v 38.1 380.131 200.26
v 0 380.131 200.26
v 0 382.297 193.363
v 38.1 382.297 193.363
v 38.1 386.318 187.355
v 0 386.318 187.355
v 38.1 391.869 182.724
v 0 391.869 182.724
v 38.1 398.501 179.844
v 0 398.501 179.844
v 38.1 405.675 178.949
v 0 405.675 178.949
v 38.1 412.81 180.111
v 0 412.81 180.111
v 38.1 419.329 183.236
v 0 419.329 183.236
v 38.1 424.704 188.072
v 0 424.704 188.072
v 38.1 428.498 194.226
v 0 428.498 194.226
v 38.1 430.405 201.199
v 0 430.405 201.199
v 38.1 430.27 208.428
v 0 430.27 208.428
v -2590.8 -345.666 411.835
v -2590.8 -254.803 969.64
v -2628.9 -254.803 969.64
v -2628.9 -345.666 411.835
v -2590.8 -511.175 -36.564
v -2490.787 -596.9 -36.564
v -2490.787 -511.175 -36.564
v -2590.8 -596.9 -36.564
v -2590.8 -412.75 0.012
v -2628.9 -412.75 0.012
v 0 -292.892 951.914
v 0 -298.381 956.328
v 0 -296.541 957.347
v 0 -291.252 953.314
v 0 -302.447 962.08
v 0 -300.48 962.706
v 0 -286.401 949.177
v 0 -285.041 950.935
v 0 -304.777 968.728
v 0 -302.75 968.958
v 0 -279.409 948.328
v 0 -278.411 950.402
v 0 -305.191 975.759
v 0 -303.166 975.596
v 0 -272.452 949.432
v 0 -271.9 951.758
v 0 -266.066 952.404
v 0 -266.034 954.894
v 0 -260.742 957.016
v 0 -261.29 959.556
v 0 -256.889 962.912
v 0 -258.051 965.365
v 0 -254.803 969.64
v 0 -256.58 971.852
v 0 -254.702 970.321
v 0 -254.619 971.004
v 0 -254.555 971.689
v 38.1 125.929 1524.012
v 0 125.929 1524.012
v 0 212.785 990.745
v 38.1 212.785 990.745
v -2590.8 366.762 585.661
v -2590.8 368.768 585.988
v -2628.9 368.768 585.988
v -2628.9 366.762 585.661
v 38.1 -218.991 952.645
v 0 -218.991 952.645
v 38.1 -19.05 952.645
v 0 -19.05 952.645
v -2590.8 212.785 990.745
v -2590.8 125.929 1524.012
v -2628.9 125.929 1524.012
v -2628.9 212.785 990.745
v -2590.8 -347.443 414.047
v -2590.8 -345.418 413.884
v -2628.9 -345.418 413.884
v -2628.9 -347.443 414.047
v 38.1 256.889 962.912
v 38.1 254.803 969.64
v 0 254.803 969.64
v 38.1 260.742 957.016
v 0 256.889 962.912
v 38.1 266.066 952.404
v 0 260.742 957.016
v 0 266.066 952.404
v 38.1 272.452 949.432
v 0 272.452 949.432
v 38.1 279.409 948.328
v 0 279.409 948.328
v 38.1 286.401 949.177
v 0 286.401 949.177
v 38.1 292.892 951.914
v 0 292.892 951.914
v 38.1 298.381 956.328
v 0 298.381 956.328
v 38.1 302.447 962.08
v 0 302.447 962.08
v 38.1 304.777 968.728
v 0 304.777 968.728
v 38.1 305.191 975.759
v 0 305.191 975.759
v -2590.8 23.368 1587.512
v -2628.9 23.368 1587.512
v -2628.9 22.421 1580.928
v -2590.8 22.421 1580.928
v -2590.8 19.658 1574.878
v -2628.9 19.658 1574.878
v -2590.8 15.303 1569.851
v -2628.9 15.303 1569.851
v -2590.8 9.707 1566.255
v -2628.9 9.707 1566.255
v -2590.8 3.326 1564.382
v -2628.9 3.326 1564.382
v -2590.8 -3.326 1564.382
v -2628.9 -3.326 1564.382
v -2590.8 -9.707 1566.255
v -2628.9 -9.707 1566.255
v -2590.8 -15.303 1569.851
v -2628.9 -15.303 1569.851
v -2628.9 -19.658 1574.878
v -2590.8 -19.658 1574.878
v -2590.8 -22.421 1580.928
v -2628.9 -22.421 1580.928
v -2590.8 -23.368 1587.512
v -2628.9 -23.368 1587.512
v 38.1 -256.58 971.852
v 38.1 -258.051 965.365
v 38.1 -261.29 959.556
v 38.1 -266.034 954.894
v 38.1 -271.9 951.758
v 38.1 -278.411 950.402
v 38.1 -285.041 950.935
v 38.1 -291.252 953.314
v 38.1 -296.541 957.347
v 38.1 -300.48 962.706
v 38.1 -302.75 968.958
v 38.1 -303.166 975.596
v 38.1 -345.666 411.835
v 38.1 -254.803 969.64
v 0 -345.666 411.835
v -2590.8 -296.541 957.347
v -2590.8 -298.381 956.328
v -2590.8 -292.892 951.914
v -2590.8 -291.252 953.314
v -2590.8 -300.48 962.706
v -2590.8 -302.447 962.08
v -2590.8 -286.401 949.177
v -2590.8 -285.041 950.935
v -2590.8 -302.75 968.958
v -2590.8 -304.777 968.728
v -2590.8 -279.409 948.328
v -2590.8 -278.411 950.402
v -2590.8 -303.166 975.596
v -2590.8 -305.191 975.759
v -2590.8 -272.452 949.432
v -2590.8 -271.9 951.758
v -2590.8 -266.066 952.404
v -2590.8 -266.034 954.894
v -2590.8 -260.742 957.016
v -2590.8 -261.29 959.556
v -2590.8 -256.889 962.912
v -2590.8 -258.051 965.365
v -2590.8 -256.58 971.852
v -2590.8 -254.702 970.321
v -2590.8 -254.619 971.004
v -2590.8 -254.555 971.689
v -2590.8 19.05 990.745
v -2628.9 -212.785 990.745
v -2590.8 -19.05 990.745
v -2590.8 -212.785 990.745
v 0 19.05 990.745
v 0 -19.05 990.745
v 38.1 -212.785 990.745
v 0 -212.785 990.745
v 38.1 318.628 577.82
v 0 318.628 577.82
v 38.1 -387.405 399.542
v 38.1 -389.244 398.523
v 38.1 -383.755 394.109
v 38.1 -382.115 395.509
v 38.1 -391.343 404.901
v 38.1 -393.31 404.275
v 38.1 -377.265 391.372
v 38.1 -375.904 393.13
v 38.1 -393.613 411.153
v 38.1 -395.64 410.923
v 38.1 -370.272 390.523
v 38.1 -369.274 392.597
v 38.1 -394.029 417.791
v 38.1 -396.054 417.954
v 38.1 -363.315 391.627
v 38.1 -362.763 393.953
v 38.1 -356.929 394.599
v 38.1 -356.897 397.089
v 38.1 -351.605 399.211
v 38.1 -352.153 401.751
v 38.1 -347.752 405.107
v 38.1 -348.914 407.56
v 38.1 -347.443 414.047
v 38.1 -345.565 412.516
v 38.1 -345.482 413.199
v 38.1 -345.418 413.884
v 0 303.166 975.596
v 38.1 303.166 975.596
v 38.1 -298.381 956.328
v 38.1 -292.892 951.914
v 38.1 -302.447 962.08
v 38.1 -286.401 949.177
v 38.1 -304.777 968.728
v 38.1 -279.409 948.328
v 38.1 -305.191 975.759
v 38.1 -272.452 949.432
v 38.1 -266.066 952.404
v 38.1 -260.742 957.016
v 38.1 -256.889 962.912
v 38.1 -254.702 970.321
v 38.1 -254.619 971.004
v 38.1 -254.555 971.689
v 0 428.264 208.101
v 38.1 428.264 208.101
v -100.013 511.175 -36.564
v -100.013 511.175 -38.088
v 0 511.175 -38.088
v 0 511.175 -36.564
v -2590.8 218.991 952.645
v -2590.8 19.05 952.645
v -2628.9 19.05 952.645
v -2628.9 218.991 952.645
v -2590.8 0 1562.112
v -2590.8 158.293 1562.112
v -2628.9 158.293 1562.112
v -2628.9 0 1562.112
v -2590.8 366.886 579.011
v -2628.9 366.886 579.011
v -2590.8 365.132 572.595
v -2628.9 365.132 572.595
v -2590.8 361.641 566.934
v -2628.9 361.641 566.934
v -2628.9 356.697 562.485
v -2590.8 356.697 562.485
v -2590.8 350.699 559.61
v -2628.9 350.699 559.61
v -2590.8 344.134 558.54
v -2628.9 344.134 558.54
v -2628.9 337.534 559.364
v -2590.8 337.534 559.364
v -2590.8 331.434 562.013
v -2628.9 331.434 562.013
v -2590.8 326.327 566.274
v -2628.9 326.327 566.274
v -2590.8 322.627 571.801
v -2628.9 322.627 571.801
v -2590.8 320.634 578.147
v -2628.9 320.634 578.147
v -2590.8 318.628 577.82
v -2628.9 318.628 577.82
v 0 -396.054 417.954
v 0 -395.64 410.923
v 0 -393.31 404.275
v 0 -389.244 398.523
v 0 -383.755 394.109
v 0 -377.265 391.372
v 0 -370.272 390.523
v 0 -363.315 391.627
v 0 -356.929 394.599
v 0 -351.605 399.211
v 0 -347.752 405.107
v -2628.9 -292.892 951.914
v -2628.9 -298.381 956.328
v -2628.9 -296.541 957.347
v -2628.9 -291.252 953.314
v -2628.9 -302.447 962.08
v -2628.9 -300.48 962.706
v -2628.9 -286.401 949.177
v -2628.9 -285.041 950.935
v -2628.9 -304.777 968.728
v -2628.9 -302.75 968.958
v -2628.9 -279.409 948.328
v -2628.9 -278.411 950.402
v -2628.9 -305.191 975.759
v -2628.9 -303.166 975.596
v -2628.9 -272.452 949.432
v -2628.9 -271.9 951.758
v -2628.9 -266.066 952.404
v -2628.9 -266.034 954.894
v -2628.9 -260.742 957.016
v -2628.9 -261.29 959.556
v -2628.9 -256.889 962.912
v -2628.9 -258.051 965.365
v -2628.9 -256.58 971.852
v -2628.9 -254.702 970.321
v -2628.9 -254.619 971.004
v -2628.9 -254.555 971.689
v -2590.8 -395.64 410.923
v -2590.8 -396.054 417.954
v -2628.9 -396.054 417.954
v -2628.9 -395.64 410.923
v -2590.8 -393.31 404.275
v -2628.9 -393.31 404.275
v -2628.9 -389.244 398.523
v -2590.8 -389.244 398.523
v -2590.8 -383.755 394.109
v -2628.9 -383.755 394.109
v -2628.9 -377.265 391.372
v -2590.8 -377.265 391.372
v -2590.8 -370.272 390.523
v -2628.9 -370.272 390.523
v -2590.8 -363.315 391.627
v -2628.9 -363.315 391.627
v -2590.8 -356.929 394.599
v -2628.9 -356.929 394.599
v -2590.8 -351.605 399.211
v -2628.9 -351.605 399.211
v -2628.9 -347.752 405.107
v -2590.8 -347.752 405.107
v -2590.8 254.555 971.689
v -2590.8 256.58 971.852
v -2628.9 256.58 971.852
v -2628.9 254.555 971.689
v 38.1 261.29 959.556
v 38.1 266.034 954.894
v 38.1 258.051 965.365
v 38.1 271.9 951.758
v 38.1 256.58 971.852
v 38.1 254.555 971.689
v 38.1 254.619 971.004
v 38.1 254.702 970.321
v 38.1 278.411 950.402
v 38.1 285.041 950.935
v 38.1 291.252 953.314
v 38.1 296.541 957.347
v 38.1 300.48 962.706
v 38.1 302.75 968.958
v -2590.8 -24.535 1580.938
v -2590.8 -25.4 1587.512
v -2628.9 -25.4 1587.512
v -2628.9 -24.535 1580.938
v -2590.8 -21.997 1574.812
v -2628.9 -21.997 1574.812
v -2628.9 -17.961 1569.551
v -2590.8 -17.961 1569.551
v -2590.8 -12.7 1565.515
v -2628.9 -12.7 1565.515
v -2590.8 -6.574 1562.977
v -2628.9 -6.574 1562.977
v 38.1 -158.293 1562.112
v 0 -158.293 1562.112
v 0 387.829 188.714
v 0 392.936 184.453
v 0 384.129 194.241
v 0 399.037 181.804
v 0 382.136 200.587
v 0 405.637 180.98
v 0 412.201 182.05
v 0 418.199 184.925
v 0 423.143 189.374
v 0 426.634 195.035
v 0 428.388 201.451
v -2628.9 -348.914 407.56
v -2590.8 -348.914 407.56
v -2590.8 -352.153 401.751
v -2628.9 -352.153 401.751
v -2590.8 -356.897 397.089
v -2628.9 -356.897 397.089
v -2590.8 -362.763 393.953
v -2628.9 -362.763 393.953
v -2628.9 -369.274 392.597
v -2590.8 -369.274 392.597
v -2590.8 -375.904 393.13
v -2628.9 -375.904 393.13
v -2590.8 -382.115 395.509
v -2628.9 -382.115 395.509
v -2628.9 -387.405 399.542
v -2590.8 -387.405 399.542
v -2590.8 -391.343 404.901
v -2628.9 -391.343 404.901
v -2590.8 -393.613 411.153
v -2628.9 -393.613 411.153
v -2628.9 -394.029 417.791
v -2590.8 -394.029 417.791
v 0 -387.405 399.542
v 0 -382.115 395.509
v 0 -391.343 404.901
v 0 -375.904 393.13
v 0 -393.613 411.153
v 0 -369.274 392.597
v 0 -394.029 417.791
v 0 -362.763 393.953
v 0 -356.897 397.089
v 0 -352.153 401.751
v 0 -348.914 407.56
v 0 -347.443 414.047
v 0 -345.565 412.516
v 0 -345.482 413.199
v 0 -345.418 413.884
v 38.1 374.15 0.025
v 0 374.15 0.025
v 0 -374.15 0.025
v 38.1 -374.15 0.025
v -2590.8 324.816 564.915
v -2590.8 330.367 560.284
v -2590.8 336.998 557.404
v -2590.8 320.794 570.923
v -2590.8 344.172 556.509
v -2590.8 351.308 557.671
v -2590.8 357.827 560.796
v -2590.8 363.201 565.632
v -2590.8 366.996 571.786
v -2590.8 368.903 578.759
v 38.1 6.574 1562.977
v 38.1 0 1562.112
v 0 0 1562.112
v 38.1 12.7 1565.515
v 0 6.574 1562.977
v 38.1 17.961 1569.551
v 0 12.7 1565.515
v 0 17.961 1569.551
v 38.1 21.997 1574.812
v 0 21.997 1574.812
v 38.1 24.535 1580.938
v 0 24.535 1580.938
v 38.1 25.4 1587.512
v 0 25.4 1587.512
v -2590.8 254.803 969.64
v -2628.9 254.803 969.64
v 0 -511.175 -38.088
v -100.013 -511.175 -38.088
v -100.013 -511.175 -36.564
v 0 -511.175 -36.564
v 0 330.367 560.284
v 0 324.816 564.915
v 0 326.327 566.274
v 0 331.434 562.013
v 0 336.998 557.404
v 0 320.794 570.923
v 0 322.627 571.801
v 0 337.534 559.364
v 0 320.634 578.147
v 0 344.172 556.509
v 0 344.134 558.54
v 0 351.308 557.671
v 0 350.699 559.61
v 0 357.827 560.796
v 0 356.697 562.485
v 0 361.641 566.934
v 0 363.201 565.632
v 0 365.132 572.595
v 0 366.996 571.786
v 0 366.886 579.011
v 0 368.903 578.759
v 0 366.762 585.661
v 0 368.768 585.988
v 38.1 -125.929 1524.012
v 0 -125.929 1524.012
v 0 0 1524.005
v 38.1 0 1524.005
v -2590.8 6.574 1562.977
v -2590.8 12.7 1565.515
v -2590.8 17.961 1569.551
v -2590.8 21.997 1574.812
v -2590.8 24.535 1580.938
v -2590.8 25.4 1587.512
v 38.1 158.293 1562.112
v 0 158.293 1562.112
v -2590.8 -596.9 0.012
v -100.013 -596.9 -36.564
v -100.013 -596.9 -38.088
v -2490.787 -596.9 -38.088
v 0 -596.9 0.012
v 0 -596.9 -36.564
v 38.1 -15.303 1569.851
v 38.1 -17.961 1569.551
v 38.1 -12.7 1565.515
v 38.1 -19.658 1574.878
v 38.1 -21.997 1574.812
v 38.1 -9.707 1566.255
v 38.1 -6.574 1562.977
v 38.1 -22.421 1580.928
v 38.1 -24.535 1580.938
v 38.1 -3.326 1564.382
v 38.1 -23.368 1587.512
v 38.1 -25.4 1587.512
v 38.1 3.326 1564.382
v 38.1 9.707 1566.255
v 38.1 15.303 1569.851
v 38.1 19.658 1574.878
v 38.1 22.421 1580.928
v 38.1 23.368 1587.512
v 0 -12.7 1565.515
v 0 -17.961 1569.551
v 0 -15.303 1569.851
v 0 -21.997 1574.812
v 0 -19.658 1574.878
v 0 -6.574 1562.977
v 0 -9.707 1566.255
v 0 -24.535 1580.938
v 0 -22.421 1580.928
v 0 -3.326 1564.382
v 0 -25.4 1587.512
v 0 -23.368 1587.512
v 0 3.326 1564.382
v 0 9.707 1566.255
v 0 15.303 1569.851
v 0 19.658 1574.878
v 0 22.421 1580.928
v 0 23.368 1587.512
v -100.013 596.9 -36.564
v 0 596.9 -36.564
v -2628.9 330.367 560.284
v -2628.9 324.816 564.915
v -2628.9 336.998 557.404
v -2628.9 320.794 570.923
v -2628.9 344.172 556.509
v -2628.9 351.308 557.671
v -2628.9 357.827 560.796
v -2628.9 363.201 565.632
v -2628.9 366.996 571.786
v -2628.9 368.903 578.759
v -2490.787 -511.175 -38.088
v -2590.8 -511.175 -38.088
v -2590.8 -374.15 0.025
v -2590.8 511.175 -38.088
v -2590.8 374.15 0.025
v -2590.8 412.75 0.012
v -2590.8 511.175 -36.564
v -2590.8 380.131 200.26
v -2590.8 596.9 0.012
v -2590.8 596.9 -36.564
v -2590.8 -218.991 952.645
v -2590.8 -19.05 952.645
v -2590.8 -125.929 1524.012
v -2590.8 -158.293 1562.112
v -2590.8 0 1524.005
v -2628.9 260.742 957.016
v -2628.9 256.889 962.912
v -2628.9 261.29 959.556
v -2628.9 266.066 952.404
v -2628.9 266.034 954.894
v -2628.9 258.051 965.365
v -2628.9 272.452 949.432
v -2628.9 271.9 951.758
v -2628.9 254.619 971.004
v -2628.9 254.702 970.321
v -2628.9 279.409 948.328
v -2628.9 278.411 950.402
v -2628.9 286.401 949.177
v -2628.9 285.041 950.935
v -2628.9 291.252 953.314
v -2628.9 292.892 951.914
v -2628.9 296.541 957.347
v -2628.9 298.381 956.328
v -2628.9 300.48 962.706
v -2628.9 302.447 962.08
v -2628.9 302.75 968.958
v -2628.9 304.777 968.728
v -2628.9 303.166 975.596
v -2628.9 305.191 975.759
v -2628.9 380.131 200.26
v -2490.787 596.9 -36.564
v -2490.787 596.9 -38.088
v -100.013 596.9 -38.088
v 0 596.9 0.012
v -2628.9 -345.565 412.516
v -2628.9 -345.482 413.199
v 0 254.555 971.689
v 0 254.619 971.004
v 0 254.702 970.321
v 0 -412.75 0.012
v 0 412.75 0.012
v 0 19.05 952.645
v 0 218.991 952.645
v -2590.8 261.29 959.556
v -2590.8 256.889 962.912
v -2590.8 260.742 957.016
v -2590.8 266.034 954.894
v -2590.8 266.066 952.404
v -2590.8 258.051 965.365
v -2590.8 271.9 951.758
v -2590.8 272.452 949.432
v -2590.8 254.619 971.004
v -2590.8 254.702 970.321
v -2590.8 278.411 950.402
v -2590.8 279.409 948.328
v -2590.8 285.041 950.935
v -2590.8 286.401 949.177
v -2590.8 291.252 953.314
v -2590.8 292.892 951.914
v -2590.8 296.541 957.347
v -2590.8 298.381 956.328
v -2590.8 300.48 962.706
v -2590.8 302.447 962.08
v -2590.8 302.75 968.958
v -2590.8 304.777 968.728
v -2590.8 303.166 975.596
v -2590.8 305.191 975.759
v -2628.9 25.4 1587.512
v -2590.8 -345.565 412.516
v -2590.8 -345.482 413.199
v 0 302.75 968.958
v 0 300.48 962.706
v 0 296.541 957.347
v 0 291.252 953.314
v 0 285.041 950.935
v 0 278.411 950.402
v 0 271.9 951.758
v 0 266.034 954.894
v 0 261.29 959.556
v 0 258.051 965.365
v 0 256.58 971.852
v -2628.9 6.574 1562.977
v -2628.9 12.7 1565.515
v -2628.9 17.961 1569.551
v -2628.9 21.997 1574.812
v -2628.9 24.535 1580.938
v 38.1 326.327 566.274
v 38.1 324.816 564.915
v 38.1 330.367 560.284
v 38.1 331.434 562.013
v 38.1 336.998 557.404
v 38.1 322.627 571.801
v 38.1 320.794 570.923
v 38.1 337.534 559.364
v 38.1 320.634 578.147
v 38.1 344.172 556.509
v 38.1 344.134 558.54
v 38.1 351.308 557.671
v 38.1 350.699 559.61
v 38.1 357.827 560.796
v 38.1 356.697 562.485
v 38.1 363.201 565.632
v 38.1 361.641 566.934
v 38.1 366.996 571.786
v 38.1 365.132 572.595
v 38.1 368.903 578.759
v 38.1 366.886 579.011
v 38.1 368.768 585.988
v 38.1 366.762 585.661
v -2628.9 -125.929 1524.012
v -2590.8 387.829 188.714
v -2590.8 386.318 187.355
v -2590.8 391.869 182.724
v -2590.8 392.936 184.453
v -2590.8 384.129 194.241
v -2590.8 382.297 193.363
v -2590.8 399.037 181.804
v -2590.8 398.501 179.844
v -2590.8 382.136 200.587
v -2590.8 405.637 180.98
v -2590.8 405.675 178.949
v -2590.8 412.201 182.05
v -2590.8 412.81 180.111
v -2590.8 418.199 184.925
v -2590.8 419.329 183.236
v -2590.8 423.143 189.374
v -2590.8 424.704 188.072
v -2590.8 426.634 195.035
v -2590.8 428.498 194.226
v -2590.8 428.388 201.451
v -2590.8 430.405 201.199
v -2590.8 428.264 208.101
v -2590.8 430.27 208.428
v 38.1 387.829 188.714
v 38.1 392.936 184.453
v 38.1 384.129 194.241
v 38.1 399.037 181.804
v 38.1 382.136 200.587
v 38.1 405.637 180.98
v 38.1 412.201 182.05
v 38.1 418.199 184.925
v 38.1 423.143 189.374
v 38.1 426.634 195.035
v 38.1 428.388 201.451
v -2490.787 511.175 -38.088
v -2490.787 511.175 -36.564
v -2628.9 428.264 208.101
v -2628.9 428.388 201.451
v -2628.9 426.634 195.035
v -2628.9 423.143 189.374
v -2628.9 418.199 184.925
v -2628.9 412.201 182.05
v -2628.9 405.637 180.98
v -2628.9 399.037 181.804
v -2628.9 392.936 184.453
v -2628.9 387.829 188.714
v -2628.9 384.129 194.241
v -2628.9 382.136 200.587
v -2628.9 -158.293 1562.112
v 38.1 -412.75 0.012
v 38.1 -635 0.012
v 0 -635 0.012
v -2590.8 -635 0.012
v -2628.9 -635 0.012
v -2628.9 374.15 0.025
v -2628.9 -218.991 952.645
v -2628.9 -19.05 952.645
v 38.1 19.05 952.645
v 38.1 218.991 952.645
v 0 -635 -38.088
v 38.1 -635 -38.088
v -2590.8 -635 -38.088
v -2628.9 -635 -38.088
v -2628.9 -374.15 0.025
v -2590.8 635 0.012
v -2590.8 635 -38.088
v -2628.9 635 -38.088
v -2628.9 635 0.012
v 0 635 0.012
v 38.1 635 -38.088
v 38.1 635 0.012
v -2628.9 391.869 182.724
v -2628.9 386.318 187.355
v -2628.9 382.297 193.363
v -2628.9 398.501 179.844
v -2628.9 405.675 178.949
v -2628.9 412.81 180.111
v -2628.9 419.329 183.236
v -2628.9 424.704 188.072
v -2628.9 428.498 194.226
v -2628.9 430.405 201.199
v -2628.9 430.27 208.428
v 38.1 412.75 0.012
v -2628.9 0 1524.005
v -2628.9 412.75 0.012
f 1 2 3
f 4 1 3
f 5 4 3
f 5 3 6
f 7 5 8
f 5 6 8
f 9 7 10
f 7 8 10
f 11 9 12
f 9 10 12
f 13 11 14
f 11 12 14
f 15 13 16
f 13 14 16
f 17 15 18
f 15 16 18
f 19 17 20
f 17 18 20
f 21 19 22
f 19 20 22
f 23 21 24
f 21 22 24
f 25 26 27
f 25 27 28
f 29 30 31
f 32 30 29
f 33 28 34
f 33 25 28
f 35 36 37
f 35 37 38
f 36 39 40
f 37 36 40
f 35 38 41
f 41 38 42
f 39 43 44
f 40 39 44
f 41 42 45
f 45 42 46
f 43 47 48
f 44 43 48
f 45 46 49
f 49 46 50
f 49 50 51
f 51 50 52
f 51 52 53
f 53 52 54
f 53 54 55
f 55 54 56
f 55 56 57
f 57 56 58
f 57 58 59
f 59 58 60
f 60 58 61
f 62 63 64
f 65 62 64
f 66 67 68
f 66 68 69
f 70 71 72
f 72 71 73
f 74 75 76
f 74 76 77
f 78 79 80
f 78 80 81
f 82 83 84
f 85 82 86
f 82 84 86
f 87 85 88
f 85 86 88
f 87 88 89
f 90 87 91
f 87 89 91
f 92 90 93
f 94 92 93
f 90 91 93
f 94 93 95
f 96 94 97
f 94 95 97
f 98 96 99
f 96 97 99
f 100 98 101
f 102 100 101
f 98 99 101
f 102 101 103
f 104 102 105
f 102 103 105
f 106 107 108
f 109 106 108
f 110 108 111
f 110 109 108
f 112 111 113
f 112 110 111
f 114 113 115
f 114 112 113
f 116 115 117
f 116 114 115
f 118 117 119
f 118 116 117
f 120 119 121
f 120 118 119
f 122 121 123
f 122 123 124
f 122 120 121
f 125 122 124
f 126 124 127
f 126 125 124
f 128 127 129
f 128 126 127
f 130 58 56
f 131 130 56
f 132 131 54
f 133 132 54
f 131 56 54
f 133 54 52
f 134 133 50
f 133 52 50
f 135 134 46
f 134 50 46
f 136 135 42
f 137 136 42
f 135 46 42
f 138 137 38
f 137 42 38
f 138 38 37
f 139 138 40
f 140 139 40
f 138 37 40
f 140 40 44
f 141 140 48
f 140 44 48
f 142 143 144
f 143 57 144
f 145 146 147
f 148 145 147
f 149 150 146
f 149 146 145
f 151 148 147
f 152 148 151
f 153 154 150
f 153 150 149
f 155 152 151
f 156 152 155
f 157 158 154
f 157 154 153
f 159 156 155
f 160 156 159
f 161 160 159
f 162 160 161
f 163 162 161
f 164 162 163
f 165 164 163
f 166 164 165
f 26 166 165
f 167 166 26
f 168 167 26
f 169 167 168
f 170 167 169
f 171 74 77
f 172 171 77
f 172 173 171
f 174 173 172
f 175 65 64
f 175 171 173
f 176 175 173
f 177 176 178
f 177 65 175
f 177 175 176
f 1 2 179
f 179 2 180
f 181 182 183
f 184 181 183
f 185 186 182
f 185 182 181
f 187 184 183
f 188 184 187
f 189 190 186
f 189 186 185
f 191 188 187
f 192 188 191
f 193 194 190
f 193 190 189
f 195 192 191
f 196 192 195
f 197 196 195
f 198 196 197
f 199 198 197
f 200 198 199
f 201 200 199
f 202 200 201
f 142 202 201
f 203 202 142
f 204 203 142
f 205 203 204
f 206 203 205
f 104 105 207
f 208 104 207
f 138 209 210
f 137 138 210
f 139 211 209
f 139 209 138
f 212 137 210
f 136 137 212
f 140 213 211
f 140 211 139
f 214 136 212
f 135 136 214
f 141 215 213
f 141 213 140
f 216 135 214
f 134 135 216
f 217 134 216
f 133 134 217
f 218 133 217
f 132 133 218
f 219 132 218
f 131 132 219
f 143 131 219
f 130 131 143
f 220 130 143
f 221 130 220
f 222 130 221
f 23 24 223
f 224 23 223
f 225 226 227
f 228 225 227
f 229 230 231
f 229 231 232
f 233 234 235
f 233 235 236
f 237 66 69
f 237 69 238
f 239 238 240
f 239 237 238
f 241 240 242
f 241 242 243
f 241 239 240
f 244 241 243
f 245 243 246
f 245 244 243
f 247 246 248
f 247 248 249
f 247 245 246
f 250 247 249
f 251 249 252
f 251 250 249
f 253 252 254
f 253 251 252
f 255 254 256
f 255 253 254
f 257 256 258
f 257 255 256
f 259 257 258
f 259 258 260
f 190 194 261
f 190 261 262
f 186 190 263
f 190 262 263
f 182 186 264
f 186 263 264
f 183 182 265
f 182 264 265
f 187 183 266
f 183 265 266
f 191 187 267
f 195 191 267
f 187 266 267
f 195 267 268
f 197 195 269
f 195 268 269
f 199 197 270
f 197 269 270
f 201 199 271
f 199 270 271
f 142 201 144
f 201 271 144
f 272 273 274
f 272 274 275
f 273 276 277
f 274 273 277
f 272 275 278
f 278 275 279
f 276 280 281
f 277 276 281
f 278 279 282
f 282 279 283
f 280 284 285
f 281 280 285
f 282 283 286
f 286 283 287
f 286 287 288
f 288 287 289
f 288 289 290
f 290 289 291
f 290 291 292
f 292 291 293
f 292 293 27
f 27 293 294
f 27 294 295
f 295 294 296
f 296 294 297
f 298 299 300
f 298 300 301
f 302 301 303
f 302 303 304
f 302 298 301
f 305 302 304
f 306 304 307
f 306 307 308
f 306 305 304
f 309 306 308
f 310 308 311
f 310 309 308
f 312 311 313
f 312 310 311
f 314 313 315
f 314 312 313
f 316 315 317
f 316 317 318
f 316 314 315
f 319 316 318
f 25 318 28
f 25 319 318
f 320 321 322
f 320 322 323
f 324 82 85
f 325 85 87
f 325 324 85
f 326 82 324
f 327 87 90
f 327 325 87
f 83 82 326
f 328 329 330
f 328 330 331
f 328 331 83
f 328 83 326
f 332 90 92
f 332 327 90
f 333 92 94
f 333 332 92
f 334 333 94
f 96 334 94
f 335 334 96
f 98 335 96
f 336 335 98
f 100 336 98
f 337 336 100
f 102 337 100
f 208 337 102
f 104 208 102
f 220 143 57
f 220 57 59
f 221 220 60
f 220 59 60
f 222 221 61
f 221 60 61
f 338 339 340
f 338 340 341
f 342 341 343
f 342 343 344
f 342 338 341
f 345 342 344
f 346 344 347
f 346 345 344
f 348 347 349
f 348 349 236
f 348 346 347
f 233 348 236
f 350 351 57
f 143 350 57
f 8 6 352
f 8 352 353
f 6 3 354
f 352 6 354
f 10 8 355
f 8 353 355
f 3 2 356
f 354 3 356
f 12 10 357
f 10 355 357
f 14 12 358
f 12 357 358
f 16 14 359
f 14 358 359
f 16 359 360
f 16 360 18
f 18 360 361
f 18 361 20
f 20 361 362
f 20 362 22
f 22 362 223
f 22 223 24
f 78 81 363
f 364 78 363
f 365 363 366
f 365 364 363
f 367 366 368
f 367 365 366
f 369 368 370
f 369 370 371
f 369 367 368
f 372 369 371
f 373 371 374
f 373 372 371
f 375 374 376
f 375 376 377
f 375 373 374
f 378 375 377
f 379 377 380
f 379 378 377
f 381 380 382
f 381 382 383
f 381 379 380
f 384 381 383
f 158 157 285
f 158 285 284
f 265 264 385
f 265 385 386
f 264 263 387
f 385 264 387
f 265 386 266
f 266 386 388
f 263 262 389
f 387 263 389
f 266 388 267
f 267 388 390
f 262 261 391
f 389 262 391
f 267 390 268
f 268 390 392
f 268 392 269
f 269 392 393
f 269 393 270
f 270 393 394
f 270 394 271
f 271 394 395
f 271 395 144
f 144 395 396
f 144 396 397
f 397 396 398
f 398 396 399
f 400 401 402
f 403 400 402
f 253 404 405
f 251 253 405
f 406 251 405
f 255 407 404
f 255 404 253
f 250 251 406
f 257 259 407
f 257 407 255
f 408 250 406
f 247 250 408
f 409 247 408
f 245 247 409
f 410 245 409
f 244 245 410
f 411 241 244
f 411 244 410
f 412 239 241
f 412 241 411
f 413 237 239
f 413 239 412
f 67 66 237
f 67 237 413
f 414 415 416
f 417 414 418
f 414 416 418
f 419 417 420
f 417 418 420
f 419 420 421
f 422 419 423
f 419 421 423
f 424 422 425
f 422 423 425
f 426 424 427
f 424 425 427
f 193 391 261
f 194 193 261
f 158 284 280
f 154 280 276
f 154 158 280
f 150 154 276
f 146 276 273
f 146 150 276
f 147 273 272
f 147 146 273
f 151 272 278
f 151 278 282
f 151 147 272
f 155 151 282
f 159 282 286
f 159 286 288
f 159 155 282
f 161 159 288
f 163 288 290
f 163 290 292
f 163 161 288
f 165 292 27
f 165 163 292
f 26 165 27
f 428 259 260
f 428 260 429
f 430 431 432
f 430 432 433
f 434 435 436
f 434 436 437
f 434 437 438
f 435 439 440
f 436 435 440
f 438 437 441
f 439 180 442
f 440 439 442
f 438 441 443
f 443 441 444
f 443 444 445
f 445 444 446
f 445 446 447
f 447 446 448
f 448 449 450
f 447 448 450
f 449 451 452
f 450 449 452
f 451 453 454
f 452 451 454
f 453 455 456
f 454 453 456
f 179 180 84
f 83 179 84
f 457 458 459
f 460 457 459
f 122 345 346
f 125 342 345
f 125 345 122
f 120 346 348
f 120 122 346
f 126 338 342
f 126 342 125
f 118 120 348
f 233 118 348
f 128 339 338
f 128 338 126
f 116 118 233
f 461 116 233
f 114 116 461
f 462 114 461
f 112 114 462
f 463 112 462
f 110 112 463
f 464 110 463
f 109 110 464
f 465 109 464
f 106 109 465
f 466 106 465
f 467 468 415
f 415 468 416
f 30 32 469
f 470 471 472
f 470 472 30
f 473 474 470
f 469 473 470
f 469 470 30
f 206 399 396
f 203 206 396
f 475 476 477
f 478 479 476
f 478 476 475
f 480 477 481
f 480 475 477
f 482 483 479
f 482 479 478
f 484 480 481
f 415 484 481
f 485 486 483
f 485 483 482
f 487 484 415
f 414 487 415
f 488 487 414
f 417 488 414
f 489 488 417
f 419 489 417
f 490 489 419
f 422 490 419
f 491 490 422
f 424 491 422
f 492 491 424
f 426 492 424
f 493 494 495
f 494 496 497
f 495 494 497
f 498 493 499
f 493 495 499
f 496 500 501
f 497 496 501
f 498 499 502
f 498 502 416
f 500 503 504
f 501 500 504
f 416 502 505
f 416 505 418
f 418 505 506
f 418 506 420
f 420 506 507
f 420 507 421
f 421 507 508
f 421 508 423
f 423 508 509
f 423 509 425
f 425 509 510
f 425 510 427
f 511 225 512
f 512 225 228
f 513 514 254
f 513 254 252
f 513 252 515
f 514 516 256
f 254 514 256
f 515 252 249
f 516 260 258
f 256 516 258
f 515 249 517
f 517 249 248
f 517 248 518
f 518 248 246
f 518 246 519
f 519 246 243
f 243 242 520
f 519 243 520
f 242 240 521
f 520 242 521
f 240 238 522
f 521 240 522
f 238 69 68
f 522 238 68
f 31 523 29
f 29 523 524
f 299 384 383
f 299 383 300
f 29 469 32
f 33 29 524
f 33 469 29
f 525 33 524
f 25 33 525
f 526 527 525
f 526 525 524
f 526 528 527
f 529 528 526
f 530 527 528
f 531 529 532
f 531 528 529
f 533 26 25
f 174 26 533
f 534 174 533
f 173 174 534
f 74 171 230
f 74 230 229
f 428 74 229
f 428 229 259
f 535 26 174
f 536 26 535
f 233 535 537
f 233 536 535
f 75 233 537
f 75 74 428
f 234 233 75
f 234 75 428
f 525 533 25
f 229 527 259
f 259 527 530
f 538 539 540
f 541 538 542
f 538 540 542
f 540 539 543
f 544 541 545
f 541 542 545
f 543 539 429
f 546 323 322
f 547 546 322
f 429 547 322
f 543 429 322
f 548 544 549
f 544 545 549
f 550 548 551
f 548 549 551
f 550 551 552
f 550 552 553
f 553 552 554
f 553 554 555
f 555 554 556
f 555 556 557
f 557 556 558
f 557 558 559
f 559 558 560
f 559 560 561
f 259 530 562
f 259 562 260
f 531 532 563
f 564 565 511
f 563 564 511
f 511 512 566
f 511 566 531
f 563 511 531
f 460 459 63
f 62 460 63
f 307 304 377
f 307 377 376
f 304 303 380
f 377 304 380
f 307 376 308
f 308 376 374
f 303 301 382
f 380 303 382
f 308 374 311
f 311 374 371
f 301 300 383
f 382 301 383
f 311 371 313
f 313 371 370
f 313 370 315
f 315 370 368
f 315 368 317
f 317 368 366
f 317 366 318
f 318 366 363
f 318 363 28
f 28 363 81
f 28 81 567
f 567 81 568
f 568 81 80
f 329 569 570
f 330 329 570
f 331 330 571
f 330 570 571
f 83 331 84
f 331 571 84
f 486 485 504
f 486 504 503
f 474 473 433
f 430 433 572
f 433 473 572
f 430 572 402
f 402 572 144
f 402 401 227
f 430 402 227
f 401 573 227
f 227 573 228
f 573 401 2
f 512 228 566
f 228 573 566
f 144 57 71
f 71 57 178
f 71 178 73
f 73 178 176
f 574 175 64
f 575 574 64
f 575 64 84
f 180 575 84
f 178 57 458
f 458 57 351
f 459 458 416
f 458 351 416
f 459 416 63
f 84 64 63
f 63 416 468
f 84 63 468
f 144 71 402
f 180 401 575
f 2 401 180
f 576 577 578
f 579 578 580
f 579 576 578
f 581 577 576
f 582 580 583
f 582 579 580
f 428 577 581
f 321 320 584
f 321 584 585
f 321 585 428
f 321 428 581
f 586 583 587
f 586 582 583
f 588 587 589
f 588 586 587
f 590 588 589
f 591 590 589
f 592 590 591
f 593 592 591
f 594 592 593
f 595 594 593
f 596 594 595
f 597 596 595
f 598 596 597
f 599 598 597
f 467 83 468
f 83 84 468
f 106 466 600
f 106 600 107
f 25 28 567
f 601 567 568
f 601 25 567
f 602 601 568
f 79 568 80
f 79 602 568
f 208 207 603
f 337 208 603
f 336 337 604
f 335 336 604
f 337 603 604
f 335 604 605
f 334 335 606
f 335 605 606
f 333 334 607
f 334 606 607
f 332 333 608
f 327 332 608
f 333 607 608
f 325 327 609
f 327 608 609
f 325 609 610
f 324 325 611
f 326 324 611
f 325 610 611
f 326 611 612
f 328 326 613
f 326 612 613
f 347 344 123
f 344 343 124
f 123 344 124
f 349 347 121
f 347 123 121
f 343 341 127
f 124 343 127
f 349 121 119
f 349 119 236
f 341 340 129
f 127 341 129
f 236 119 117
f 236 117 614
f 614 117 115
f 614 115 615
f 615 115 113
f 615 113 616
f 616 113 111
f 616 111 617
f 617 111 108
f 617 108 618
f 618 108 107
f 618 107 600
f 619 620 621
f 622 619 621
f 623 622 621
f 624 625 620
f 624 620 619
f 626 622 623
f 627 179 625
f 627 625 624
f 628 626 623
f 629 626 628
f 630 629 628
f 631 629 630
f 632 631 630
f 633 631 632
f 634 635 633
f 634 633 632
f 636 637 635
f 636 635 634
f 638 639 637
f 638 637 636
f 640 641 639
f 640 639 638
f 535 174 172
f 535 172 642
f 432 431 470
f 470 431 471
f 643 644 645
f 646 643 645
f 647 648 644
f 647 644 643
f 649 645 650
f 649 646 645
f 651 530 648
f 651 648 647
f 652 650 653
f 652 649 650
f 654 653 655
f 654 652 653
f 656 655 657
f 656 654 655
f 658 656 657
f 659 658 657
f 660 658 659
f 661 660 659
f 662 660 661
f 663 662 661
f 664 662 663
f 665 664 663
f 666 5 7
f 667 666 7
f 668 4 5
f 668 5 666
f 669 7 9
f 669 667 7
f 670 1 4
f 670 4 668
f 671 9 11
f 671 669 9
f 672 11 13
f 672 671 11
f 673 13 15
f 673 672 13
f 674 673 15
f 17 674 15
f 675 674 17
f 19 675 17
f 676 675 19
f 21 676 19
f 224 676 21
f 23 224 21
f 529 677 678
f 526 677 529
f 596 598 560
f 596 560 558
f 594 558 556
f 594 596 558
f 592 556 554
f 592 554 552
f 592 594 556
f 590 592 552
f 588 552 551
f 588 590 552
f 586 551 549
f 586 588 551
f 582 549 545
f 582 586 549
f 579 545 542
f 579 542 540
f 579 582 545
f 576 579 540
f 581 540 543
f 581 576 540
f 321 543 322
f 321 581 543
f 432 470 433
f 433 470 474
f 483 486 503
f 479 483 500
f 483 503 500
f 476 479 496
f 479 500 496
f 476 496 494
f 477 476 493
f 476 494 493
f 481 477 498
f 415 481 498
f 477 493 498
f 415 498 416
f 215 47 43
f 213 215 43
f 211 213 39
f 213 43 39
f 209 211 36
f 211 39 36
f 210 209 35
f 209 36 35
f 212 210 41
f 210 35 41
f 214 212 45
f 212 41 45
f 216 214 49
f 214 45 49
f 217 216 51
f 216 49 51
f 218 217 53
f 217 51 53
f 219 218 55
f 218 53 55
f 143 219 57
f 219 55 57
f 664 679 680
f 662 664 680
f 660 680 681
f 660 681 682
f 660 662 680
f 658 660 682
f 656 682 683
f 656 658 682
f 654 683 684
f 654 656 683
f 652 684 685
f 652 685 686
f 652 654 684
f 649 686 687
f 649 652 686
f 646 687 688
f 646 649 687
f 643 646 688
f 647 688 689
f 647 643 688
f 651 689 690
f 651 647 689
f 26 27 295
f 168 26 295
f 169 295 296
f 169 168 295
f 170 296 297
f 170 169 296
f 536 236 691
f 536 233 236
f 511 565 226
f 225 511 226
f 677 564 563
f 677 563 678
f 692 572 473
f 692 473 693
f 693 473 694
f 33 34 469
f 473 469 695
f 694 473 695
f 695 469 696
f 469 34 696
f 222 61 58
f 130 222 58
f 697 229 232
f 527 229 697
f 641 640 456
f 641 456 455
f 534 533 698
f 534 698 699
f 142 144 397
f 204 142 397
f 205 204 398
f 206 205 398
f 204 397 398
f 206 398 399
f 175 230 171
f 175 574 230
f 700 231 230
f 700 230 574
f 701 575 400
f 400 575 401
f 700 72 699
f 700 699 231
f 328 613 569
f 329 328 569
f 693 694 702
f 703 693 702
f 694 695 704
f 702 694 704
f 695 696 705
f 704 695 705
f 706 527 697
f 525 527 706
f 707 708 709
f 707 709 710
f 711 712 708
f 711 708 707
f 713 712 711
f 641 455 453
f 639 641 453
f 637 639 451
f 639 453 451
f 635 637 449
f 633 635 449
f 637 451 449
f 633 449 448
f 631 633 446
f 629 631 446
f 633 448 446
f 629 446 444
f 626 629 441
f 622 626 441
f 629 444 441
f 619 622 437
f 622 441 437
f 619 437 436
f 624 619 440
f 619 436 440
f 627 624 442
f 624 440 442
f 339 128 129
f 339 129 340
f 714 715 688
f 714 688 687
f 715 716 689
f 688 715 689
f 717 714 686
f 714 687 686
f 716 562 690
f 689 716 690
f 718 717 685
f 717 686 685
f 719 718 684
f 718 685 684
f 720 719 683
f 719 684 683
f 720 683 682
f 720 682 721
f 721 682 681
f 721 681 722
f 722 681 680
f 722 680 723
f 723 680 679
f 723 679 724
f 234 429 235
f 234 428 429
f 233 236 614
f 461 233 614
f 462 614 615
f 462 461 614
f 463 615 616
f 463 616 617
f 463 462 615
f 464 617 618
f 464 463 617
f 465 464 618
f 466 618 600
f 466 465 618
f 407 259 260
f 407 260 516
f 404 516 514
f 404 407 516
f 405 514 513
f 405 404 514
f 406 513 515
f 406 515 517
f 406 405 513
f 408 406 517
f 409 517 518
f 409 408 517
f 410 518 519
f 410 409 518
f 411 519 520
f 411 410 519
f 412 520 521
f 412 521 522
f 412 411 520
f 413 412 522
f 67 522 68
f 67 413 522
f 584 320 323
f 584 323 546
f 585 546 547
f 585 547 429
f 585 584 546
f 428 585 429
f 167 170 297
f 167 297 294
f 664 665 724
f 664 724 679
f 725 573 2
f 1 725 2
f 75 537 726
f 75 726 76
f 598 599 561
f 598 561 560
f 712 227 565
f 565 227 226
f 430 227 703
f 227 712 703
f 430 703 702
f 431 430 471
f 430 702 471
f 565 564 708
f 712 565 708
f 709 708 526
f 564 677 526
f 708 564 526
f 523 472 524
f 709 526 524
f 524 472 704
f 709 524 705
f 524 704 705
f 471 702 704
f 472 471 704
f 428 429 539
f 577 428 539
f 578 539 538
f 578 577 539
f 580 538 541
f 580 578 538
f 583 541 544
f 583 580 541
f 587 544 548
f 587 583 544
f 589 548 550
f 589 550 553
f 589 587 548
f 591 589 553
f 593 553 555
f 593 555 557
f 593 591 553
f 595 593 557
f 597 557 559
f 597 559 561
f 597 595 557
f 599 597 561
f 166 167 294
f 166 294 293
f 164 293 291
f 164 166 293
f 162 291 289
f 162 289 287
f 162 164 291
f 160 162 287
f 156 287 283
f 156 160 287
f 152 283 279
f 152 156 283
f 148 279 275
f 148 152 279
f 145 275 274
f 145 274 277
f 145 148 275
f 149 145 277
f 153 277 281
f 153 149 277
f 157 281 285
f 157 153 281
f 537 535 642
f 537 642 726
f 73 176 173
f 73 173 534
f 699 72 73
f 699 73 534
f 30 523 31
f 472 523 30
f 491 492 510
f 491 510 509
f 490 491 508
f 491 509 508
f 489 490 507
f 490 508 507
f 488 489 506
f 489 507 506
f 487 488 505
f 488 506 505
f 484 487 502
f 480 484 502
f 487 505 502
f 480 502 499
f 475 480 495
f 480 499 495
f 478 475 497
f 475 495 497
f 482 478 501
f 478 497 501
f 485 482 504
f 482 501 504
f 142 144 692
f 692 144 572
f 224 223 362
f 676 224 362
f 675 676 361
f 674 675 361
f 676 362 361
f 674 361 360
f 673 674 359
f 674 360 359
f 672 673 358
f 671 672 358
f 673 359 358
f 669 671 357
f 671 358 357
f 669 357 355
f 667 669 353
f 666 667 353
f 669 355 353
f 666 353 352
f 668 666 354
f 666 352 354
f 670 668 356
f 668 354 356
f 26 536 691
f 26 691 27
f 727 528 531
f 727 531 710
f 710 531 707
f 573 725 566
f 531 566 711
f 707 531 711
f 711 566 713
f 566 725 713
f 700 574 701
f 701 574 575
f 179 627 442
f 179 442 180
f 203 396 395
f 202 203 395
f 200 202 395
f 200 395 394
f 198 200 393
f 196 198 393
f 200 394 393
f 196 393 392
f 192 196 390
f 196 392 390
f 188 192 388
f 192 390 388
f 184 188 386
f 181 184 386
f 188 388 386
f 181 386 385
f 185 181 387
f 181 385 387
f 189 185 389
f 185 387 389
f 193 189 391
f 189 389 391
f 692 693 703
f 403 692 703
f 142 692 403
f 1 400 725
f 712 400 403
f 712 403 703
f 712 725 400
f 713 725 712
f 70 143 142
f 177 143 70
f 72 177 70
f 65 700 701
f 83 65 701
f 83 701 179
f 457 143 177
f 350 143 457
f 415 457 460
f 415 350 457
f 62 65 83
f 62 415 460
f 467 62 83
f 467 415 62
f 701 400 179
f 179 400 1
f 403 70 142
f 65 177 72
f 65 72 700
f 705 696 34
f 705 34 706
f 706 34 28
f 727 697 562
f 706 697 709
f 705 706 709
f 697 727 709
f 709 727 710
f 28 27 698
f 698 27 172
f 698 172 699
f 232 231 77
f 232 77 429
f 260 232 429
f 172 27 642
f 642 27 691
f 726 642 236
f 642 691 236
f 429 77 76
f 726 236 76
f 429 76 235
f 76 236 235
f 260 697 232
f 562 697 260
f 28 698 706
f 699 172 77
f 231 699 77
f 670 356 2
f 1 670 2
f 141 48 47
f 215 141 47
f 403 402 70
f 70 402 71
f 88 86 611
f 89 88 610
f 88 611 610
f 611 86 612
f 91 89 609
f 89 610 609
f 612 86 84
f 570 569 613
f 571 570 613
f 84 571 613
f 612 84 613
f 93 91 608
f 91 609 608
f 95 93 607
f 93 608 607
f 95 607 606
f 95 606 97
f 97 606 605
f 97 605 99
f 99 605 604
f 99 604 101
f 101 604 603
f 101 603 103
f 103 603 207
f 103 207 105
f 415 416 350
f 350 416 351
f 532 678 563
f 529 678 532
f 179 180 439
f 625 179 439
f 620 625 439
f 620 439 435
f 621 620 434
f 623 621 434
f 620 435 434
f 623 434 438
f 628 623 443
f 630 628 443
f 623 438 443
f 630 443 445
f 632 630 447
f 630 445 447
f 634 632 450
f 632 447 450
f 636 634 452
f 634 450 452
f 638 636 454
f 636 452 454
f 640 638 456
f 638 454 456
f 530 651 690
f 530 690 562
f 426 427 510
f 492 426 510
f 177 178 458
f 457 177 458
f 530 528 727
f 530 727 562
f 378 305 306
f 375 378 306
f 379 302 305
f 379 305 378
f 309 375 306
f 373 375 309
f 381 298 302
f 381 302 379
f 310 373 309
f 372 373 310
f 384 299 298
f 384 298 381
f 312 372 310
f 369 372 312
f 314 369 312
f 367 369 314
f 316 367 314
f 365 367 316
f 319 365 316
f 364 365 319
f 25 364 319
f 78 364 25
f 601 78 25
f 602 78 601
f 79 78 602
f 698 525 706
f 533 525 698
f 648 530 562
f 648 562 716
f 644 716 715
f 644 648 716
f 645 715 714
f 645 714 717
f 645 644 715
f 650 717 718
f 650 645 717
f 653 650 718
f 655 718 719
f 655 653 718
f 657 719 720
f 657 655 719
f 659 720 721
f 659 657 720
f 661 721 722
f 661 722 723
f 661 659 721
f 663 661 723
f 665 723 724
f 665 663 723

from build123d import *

# Parameters (mm, degrees)
F2_DEPTH  = 38.1
F5_DEPTH  = 38.1
F7_W      = 38.1000000541
F7_H      = 38.1
F8_DEPTH  = 2590.8
F10_DEPTH = 2628.9
F12_W     = 100.0124999999
F12_H     = 85.725
F13_DEPTH = 1.524


# Not quite as in the source:
# - an extrude ends at something that could not be found from the text; its depth is read off the source's solid
# - ends of sketch curves that miss each other by under 0.0002 mm in the source are joined


with BuildPart() as f2:
    # F1 (on Right) → F2 (new body)
    with BuildSketch(Plane.YZ):
        Polygon((634.9999999459, 0.0117264176), (412.7499999459, 0.0117264176), (158.2933200412, 1562.1117264176), (0, 1562.1117264176), (-158.2933200412, 1562.1117264176), (-412.7499999459, 0.0117264176), (-634.9999999459, 0.0117264176), (-634.9999999459, -38.0882735824), (5.41e-08, -38.0882735824), (634.9999999459, -38.0882735824), align=None)
        Polygon((218.9908951289, 952.644992336), (374.1500007125, 0.0247576549), (0, 0.0247576549), (-374.1500007125, 0.0247576549), (-218.9908951289, 952.644992336), (0, 952.644992336), align=None, mode=Mode.SUBTRACT)
        Polygon((125.9288876334, 1524.0117264176), (212.785315444, 990.7449849442), (0, 990.7449849442), (-212.785315444, 990.7449849442), (-125.9288876334, 1524.0117264176), (0, 1524.0052894621), align=None, mode=Mode.SUBTRACT)
    extrude(amount=F2_DEPTH)


with BuildPart() as f3_1:
    # F3: instance of F2
    add(f2.part.mirror(Plane.YZ.offset(-1295.4)))


with BuildPart() as f5:
    # F4 (on Right) → F5 (new body)
    with BuildSketch(Plane.YZ):
        with BuildLine():
            Line((256.5800290113, 971.8518066202), (254.554561688, 971.6889996104))
            ThreePointArc((254.554561688, 971.6889996104), (281.9079908515, 948.4057456927), (305.1912447692, 975.7591748562))
            Line((305.1912447692, 975.7591748562), (303.165777446, 975.5963678464))
            ThreePointArc((303.165777446, 975.5963678464), (281.7451838417, 950.4312130159), (256.5800290113, 971.8518066202))
        make_face()
    extrude(amount=F5_DEPTH)


with BuildPart() as f5b:
    # F4 (on Right) → F5, piece 2 (new body)
    with BuildSketch(Plane.YZ):
        with BuildLine():
            Line((430.2698480282, 208.4277475534), (428.2642817252, 208.1010553365))
            ThreePointArc((428.2642817252, 208.1010553365), (408.9572297354, 181.280082359), (382.1362567578, 200.5871343488))
            Line((382.1362567578, 200.5871343488), (380.1306904549, 200.260442132))
            ThreePointArc((380.1306904549, 200.260442132), (409.2839219522, 179.2745160561), (430.2698480282, 208.4277475534))
        make_face()
    extrude(amount=F5_DEPTH)


with BuildPart() as f5c:
    # F4 (on Right) → F5, piece 3 (new body)
    with BuildSketch(Plane.YZ):
        with BuildLine():
            Line((320.6340097877, 578.1471183433), (318.6284438739, 577.8204237375))
            ThreePointArc((318.6284438739, 577.8204237375), (347.7817003689, 556.8345323879), (368.7675917185, 585.987788883))
            Line((368.7675917185, 585.987788883), (366.7620258047, 585.6610942772))
            ThreePointArc((366.7620258047, 585.6610942772), (347.4550057631, 558.8400983017), (320.6340097877, 578.1471183433))
        make_face()
    extrude(amount=F5_DEPTH)


with BuildPart() as f5d:
    # F4 (on Right) → F5, piece 4 (new body)
    with BuildSketch(Plane.YZ):
        with BuildLine():
            ThreePointArc((-305.1912447692, 975.7591748562), (-281.9079908515, 948.4057456927), (-254.554561688, 971.6889996104))
            Line((-254.554561688, 971.6889996104), (-256.5800290113, 971.8518066202))
            ThreePointArc((-256.5800290113, 971.8518066202), (-281.7451838417, 950.4312130159), (-303.165777446, 975.5963678464))
            Line((-303.165777446, 975.5963678464), (-305.1912447692, 975.7591748562))
        make_face()
    extrude(amount=F5_DEPTH)


with BuildPart() as f5e:
    # F4 (on Right) → F5, piece 5 (new body)
    with BuildSketch(Plane.YZ):
        with BuildLine():
            ThreePointArc((-396.0543227014, 417.9541524412), (-372.7710687837, 390.6007232777), (-345.4176396202, 413.8839771954))
            Line((-345.4176396202, 413.8839771954), (-347.4431069434, 414.0467842053))
            ThreePointArc((-347.4431069434, 414.0467842053), (-372.6082617739, 392.626190601), (-394.0288553782, 417.7913454314))
            Line((-394.0288553782, 417.7913454314), (-396.0543227014, 417.9541524412))
        make_face()
    extrude(amount=F5_DEPTH)


with BuildPart() as f5f:
    # F4 (on Right) → F5, piece 6 (new body)
    with BuildSketch(Plane.YZ):
        with BuildLine():
            Line((-23.368, 1587.5117264176), (-25.4, 1587.5117264176))
            ThreePointArc((-25.4, 1587.5117264176), (0, 1562.1117264176), (25.4, 1587.5117264176))
            Line((25.4, 1587.5117264176), (23.368, 1587.5117264176))
            ThreePointArc((23.368, 1587.5117264176), (0, 1564.1437264176), (-23.368, 1587.5117264176))
        make_face()
    extrude(amount=F5_DEPTH)


with BuildPart() as f6_1:
    # F6: instance of F5d
    add(f5d.part.mirror(Plane.YZ.offset(-1295.4)))


with BuildPart() as f6_2:
    # F6: instance of F5e
    add(f5e.part.mirror(Plane.YZ.offset(-1295.4)))


with BuildPart() as f6_3:
    # F6: instance of F5f
    add(f5f.part.mirror(Plane.YZ.offset(-1295.4)))


with BuildPart() as f6_4:
    # F6: instance of F5
    add(f5.part.mirror(Plane.YZ.offset(-1295.4)))


with BuildPart() as f6_5:
    # F6: instance of F5c
    add(f5c.part.mirror(Plane.YZ.offset(-1295.4)))


with BuildPart() as f6_6:
    # F6: instance of F5b
    add(f5b.part.mirror(Plane.YZ.offset(-1295.4)))


with BuildPart() as f2_1:
    add(f2.part)

    add(f3_1.part)  # F8 merges F3_1
    # F7 (on Right) → F8 (join, through all)
    with BuildSketch(Plane.YZ):
        with Locations((615.9499999729, -19.0382735824)):
            Rectangle(F7_W, F7_H)
        with Locations((-615.9499999729, -19.0382735824)):
            Rectangle(F7_W, F7_H)
    extrude(amount=-F8_DEPTH)

    # F9 (on Right) → F10 (join, through all)
    with BuildSketch(Plane.YZ):
        Polygon((19.05, 990.7449849442), (0, 990.7449849442), (-19.05, 990.7449849442), (-19.05, 952.6449849442), (0, 952.6449849442), (19.05, 952.6449849442), align=None)
    extrude(amount=-F10_DEPTH)

    # F12 (on offset) → F13 (join)
    with BuildSketch(Plane(origin=(0, 0, -38.0882735824), x_dir=(1, 0, 0), z_dir=(0, 0, -1))):
        with Locations((-50.0062500002, -554.0374999459)):
            Rectangle(F12_W, F12_H)
        with Locations((-50.0062500001, 554.0374999459)):
            Rectangle(F12_W, F12_H)
    extrude(amount=-F13_DEPTH)



with BuildPart() as f2_2:
    add(f2_1.part)

    add(f5.part)  # F14 merges F5

    add(f5b.part)  # F14 merges F5b

    add(f5c.part)  # F14 merges F5c

    add(f5d.part)  # F14 merges F5d

    add(f5e.part)  # F14 merges F5e

    add(f5f.part)  # F14 merges F5f

    add(f6_1.part)  # F14 merges F6_1

    add(f6_2.part)  # F14 merges F6_2

    add(f6_3.part)  # F14 merges F6_3

    add(f6_4.part)  # F14 merges F6_4

    add(f6_5.part)  # F14 merges F6_5

    add(f6_6.part)  # F14 merges F6_6
    # F14: F2 across plane
    add(f2_1.part.mirror(Plane.YZ.offset(-1295.4)))


solid = f2_2.part
